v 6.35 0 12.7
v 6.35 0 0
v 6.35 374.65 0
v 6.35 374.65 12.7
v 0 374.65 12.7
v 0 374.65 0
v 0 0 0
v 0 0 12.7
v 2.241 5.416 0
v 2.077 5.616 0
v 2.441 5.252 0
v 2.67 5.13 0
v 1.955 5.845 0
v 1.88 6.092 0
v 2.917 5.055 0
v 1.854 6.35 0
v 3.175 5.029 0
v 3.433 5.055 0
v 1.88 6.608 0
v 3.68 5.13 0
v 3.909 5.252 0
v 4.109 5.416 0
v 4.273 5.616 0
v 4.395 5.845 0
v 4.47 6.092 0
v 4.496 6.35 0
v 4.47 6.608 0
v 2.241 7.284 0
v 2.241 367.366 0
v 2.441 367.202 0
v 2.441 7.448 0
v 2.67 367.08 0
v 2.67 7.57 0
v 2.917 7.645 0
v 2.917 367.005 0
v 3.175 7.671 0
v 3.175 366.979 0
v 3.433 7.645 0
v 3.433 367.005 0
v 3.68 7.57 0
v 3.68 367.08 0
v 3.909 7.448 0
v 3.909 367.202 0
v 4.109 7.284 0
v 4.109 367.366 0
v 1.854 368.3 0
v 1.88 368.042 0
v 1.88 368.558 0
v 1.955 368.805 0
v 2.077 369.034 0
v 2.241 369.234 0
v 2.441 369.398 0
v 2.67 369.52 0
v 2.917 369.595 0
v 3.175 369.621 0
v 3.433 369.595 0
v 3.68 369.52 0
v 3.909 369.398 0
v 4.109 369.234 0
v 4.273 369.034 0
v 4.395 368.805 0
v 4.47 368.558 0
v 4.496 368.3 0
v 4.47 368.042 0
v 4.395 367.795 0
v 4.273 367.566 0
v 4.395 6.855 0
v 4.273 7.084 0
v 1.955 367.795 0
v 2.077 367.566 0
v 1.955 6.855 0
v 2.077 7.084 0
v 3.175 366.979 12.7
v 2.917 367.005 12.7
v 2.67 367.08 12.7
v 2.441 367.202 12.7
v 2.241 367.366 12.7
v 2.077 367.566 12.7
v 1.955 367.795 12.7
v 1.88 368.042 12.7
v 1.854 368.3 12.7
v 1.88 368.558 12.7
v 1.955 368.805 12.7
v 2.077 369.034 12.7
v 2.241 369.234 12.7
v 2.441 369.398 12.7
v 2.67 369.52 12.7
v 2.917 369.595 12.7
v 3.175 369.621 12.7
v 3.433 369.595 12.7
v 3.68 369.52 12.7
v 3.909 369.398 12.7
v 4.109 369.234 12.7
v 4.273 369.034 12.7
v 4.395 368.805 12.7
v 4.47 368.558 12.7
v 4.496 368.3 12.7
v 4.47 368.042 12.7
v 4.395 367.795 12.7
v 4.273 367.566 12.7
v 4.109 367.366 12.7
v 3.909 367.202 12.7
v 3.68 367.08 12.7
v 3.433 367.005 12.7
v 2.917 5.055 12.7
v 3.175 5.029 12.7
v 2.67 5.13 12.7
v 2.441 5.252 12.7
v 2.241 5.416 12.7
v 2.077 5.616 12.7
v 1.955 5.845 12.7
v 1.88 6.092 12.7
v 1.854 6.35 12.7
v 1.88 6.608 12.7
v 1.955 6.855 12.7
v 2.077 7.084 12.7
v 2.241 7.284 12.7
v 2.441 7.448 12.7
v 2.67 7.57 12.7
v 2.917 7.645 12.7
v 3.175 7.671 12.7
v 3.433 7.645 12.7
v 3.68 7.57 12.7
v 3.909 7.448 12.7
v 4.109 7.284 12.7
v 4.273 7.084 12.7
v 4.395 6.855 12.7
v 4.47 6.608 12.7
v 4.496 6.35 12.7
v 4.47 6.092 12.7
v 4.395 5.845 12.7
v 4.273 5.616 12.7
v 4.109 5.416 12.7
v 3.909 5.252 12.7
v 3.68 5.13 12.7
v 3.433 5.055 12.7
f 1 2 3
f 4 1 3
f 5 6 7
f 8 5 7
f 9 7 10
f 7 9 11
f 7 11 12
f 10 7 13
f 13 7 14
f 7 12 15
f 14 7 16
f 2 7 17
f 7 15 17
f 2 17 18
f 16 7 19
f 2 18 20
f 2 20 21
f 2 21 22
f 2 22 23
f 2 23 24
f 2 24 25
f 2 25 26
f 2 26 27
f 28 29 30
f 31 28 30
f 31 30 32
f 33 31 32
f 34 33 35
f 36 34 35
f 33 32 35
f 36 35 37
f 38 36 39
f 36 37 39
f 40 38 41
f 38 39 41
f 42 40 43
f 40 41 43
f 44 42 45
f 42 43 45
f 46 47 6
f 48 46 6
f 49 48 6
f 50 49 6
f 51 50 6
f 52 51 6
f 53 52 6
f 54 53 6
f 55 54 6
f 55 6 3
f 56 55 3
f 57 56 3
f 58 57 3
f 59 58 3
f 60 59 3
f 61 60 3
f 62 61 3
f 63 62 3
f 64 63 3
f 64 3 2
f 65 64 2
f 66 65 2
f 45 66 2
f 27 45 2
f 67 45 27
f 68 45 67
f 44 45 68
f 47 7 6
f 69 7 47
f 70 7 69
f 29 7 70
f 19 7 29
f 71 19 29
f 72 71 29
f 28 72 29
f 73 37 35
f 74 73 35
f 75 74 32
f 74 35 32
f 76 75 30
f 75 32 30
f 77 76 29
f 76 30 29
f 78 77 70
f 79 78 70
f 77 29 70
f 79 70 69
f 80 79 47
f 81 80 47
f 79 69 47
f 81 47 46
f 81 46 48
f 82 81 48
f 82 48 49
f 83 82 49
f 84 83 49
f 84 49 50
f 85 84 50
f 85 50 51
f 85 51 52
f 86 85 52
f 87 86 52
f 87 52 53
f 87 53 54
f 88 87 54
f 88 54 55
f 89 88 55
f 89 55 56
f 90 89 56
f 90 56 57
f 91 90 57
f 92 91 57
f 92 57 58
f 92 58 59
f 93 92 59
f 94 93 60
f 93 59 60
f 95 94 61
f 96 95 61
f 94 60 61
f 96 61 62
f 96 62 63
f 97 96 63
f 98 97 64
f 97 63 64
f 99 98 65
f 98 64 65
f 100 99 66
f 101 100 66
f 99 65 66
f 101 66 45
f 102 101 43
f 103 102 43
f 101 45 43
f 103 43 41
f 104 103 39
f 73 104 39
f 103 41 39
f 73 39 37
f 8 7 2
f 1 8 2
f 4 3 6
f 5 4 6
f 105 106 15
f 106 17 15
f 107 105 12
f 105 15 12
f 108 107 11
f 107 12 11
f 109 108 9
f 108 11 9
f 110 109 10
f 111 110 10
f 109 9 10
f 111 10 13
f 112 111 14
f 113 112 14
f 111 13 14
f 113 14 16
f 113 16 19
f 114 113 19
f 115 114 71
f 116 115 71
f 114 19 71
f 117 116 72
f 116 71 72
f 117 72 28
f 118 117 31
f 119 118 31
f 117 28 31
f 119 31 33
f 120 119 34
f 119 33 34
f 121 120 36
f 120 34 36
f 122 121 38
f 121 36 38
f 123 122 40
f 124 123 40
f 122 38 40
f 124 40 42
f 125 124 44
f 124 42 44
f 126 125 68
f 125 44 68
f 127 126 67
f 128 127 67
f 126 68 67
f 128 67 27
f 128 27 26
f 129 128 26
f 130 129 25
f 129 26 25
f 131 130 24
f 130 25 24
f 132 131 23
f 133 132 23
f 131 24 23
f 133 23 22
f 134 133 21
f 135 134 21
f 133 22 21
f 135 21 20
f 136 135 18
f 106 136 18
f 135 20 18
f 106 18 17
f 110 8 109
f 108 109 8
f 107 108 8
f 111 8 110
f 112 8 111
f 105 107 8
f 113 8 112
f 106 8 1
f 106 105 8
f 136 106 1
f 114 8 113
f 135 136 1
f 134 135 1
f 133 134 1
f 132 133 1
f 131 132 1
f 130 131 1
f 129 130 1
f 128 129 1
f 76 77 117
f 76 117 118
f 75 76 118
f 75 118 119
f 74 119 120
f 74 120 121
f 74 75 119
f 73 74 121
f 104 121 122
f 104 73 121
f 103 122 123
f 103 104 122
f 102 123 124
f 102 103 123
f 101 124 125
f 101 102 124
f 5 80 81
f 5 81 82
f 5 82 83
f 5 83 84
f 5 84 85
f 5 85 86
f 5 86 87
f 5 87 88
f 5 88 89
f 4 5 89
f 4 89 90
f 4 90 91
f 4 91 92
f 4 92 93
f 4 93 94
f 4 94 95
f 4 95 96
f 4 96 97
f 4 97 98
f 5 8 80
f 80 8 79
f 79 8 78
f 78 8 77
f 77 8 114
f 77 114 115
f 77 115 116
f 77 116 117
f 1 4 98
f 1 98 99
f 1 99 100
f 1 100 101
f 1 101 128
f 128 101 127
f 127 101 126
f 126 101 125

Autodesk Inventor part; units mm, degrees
ref_plane "YZ Plane" through (0, 0, 0) normal (1, 0, 0) x (0, 1, 0)
ref_plane "XZ Plane" through (0, 0, 0) normal (0, 1, 0) x (-1, 0, 0)
ref_plane "XY Plane" through (0, 0, 0) normal (0, 0, 1) x (1, 0, 0)
sketch "Sketch1" plane through (0, 0, 0) normal (0, 0, 1) x (1, 0, 0)
  line L0 (0, 0) -> (6.35, 0)
  line L1 (6.35, 0) -> (6.35, 374.65)
  line L2 (6.35, 374.65) -> (0, 374.65)
  line L3 (0, 374.65) -> (0, 0)
  dimension "d0" = 6.35
  dimension "d1" = 374.65
extrude "Extrusion1" add sketch "Sketch1" along normal blind 12.7
sketch "Sketch2" plane through (0, 0, 12.7) normal (0, 0, 1) x (1, 0, 0)
  line L0 (0, 0) -> (6.35, 0) projected
  line L1 (3.175, 0) -> (3.175, 6.35)
  circle A0 centre (3.175, 6.35) radius 1.778
  line L2 (6.35, 374.65) -> (0, 374.65) projected
  line L3 (3.175, 374.65) -> (3.175, 368.3)
  circle A1 centre (3.175, 368.3) radius 1.778
  dimension "d4" = 6.35
  dimension "d5" = 3.556
  dimension "d6" = 6.35
  dimension "d7" = 3.556
hole "Hole1" at (3.175, 368.3, 12.7) at (3.175, 6.35, 12.7) direction (0, 0, -1) diameter 2.6416 depth 12.7 tip angle 118 thread size "6-32 UNC" class "2B" standard "ANSI Unified Screw Threads"
properties part number "GlyphPlateRightSide"
